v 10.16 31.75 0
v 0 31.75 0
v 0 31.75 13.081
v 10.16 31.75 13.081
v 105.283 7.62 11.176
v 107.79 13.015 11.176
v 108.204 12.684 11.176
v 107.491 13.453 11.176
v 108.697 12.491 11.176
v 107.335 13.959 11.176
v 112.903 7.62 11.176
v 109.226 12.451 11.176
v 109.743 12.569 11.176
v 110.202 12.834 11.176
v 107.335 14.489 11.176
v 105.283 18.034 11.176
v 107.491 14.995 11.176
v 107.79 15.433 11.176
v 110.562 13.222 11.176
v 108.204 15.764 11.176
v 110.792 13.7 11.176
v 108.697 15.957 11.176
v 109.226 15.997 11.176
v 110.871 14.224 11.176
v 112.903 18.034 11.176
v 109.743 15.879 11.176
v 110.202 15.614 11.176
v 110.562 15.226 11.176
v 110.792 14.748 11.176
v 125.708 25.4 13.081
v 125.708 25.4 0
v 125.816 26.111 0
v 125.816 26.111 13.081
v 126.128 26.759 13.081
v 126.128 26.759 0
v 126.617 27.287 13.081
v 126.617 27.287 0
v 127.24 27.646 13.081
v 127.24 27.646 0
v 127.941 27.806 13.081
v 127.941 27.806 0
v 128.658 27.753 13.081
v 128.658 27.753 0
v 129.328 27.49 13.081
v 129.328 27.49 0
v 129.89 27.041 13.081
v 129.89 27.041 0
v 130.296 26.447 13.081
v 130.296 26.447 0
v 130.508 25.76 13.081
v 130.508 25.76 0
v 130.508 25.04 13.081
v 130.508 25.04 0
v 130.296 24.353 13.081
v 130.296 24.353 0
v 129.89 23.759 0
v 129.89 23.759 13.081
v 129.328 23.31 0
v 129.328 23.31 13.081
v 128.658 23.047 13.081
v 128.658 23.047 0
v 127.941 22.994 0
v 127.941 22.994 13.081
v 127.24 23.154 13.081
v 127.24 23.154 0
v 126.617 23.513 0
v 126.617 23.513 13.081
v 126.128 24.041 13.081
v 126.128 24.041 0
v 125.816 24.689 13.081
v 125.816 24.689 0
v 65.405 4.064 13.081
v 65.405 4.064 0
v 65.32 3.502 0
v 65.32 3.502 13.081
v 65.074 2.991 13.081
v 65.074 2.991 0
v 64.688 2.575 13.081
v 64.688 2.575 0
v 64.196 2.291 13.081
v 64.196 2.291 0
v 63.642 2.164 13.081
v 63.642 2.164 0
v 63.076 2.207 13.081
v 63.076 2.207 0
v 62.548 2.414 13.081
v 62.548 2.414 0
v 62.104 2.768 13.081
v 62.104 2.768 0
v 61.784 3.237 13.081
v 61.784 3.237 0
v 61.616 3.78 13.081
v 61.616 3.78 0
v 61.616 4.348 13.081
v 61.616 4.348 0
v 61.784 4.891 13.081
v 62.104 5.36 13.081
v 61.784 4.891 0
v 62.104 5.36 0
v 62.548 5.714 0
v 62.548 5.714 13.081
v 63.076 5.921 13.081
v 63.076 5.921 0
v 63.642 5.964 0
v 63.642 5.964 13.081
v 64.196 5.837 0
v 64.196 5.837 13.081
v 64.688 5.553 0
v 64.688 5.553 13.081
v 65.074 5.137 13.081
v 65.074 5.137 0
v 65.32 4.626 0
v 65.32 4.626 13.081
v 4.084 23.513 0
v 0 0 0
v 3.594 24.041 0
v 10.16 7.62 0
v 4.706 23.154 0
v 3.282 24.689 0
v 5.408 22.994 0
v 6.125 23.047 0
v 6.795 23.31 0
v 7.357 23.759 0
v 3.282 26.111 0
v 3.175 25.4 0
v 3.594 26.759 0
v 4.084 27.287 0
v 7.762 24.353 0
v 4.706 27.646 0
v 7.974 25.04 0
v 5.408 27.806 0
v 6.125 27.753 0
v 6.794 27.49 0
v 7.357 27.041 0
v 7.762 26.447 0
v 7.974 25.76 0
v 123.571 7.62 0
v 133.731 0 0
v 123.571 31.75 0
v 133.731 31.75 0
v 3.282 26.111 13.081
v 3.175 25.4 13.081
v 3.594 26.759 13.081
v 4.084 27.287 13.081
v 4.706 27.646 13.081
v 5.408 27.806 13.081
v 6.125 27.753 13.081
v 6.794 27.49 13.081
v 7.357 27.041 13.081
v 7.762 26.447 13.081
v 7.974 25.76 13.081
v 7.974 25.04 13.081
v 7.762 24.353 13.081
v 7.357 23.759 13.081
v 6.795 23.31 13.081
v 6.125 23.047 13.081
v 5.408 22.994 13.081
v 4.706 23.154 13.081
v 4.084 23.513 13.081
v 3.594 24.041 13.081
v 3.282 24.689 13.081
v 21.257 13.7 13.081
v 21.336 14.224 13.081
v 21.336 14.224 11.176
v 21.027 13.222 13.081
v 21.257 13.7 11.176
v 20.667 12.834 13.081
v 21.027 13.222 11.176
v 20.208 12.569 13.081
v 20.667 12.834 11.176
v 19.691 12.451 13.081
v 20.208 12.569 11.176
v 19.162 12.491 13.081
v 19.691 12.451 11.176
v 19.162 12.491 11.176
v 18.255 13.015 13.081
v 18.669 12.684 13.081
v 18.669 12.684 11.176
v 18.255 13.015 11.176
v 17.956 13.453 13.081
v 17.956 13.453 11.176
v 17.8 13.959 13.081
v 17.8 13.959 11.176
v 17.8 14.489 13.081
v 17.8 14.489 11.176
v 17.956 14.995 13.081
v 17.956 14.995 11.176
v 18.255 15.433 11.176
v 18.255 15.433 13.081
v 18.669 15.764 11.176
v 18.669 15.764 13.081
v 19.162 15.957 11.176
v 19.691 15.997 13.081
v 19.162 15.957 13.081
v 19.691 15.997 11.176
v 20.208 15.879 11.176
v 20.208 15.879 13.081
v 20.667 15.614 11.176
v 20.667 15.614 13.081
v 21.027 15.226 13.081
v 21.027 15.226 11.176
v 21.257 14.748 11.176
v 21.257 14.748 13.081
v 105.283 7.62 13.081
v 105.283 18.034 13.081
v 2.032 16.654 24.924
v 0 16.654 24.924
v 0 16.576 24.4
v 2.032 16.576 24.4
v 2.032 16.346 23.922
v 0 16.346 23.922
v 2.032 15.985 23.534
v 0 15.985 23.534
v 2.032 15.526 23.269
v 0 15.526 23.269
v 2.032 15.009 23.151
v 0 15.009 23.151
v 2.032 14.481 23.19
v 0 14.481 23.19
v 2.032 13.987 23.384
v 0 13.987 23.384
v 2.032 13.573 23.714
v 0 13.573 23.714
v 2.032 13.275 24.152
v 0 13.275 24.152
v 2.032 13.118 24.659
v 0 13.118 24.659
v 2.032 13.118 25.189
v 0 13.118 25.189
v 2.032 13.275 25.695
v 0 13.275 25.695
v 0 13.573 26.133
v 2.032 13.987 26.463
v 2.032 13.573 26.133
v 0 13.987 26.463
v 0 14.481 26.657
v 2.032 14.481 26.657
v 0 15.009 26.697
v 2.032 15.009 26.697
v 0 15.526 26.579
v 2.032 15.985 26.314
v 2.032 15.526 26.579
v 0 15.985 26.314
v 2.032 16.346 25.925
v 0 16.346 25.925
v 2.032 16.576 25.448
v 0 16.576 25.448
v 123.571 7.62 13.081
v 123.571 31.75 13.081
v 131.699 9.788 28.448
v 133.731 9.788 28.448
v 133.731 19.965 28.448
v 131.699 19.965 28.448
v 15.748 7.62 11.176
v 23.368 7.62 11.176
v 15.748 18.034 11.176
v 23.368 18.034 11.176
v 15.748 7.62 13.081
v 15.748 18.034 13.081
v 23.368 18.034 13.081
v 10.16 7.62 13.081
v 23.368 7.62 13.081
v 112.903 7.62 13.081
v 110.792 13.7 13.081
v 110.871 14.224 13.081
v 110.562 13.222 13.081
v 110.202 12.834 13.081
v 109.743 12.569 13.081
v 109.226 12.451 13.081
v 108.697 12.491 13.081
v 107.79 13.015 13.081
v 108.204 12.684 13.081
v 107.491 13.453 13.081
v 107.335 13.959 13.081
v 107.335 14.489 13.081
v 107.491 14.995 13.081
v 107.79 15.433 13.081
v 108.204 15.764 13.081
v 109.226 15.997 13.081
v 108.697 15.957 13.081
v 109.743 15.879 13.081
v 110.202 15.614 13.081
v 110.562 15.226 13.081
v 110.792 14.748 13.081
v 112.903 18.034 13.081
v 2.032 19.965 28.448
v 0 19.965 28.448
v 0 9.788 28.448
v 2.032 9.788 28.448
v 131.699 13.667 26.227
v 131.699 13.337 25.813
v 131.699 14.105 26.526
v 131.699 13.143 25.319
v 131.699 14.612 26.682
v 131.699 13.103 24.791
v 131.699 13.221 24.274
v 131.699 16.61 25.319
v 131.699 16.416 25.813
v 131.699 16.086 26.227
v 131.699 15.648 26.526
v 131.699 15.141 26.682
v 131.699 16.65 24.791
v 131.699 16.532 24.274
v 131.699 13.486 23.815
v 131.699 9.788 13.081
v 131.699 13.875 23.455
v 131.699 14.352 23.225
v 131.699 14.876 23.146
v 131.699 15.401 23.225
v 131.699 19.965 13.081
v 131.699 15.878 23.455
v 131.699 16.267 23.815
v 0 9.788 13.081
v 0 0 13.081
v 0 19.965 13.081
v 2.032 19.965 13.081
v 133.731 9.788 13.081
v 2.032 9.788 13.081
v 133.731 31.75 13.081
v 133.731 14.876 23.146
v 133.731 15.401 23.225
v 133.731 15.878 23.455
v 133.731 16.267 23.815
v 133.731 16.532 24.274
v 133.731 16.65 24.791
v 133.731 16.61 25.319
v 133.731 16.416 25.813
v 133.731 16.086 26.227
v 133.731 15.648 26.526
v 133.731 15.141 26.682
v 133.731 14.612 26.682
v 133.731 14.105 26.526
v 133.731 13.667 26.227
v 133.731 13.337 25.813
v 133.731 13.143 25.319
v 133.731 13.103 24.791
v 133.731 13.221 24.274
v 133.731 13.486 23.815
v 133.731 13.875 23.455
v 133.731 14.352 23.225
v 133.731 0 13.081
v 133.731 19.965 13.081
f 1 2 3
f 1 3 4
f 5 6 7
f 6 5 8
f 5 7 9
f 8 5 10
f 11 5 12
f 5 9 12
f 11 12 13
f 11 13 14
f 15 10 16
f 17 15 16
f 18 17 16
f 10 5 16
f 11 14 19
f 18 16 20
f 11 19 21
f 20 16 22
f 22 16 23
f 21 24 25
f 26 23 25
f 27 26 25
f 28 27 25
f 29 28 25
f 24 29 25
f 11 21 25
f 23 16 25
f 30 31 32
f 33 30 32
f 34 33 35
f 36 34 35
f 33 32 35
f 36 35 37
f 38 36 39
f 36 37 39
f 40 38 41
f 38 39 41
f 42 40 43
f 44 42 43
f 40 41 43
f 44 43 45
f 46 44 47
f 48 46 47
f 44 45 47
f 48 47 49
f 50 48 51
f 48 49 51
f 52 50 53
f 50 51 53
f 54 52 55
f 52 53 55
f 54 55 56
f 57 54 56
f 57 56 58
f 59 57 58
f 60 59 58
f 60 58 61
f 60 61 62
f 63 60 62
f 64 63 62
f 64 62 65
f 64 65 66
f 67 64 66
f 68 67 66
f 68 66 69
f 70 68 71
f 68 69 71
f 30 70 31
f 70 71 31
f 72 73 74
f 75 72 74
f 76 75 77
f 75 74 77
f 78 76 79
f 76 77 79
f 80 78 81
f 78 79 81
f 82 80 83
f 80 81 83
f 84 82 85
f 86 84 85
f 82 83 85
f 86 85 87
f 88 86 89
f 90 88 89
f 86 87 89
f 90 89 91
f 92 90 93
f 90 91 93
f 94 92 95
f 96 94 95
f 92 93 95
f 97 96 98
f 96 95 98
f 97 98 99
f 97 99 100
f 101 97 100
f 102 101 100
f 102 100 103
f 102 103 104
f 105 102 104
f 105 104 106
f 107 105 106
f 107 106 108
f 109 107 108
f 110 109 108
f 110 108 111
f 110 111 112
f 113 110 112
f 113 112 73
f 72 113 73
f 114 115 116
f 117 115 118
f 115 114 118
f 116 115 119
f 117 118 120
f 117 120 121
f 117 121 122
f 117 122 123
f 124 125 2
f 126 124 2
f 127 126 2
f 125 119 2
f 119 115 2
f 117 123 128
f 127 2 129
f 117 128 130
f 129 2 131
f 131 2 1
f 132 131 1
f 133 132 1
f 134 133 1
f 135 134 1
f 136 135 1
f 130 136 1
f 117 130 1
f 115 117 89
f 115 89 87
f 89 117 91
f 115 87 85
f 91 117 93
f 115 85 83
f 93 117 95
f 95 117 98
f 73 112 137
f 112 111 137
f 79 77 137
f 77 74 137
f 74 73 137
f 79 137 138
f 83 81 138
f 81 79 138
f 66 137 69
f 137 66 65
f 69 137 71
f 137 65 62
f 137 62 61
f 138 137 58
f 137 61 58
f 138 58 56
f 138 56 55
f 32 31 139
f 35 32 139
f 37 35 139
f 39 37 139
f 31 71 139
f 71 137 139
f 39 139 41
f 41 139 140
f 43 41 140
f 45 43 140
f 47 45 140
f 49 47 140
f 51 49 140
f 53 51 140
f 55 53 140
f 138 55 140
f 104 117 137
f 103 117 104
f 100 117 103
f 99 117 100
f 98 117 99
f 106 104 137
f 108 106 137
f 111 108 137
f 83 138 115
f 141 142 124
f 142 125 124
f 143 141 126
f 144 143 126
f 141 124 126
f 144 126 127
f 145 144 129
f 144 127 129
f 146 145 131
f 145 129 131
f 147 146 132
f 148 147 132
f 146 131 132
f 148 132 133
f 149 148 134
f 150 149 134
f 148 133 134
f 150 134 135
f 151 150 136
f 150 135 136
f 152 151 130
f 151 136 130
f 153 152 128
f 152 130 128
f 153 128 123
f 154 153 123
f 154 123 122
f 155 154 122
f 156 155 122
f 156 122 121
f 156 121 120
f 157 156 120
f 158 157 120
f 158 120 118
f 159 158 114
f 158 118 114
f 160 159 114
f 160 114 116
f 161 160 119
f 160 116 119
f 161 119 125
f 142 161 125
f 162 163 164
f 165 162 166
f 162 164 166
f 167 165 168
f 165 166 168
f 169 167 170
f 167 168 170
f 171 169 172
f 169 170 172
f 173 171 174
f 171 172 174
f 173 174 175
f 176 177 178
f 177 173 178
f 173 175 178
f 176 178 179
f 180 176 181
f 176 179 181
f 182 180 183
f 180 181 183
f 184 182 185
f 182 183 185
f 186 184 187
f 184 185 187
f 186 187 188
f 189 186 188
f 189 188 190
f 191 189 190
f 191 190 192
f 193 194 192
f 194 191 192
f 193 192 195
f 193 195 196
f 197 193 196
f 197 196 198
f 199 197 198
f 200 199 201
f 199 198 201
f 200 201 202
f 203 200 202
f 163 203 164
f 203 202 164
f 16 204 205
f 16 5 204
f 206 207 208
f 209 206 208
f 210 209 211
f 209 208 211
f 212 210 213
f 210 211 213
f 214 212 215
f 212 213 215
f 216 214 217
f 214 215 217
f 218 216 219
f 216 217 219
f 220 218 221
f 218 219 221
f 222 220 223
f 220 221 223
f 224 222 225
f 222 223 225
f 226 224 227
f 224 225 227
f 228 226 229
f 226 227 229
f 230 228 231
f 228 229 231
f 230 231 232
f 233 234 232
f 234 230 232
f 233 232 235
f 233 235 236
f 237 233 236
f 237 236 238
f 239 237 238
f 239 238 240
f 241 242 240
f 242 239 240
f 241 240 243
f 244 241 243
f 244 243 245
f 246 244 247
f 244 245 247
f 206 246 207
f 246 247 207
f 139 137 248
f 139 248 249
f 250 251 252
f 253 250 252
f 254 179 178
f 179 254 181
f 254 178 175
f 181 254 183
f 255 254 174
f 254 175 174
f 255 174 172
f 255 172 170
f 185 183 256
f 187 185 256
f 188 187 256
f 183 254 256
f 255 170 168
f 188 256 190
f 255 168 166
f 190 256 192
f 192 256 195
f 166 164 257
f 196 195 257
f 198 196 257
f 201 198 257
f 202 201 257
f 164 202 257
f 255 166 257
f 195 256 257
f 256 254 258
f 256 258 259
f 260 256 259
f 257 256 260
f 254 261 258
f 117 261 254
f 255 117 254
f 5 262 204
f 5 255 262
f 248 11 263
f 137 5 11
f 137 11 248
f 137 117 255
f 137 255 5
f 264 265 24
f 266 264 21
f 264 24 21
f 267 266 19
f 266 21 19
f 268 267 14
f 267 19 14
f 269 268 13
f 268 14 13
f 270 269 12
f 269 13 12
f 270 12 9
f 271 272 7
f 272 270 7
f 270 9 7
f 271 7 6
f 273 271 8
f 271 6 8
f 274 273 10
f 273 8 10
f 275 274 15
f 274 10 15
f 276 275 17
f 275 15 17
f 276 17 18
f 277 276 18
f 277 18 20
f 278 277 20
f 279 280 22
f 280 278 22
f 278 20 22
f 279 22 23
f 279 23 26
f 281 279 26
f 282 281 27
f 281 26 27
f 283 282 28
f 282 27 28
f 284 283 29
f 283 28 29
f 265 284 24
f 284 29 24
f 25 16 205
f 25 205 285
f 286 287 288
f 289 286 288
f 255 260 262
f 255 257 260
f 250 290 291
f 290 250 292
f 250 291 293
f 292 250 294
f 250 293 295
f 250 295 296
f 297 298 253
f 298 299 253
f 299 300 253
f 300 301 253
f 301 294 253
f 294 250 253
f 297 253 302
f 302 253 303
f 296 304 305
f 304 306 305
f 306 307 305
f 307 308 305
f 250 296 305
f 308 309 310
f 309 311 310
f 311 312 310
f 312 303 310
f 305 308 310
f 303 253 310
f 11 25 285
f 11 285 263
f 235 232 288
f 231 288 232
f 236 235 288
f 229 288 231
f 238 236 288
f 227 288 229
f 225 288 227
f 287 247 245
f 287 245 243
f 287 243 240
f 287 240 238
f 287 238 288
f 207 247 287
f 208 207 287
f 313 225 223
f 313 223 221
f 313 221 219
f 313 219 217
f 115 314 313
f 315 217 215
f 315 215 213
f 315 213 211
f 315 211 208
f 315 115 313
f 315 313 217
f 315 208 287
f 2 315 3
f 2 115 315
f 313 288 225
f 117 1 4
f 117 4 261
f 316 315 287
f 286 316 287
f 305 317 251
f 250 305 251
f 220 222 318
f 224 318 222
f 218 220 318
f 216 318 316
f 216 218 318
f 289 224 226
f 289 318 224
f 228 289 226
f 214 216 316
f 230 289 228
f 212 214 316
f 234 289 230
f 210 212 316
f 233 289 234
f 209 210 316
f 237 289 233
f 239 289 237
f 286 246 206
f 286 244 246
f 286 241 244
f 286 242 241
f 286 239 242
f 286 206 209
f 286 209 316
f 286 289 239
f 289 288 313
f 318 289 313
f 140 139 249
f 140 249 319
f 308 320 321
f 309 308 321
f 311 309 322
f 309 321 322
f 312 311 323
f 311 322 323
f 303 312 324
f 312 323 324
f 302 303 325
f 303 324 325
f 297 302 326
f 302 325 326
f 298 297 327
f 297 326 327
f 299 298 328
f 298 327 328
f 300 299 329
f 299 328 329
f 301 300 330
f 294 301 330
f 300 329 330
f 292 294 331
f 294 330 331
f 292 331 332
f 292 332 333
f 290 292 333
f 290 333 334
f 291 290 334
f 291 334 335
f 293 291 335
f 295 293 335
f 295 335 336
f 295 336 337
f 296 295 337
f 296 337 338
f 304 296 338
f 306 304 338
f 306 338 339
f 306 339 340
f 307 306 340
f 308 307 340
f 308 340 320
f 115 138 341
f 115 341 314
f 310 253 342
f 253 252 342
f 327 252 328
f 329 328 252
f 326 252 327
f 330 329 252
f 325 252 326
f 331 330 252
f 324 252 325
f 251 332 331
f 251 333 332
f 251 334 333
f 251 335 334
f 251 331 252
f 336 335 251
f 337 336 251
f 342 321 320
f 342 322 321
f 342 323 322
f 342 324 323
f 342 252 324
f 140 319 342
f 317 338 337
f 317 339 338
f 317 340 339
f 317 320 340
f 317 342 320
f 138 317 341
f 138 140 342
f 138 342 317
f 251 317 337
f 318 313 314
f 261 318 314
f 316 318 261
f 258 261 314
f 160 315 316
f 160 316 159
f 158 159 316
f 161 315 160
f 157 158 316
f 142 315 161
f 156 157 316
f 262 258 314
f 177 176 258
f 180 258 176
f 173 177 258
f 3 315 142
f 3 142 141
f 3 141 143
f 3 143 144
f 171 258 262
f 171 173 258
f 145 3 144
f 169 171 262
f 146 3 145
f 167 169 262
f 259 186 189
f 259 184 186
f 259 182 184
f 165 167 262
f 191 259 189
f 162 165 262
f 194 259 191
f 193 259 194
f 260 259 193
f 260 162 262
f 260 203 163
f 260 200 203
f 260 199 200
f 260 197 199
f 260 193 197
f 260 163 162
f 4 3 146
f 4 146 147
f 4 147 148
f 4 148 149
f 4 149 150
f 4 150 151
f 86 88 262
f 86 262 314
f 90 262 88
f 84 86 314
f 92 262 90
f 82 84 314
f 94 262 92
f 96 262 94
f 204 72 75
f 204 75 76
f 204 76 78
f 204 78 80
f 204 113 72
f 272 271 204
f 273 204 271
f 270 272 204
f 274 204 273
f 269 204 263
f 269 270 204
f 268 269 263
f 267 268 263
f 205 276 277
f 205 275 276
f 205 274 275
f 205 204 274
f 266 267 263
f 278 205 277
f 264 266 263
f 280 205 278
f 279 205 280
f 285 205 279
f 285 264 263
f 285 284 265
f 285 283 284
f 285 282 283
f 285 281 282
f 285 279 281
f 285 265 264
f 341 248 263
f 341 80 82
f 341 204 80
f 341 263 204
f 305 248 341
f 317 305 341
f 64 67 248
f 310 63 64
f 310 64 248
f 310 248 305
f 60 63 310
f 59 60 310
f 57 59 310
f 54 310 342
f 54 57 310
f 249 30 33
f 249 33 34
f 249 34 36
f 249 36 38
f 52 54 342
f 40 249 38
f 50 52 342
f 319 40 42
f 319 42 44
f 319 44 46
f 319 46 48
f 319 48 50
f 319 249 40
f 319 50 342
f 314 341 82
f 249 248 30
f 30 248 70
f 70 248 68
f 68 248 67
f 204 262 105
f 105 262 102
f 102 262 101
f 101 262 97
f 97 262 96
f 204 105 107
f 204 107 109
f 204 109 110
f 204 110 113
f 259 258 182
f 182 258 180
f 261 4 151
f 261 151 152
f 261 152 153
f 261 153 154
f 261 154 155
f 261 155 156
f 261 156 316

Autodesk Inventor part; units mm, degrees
ref_plane "YZ Plane" through (0, 0, 0) normal (1, 0, 0) x (0, 1, 0)
ref_plane "XZ Plane" through (0, 0, 0) normal (0, 1, 0) x (-1, 0, 0)
ref_plane "XY Plane" through (0, 0, 0) normal (0, 0, 1) x (1, 0, 0)
sketch "Sketch1" plane through (0, 0, 0) normal (0, 0, 1) x (1, 0, 0)
  line L0 (0, 0) -> (0, 31.75)
  line L1 (0, 31.75) -> (10.16, 31.75)
  line L2 (10.16, 31.75) -> (10.16, 7.62)
  line L3 (10.16, 7.62) -> (15.748, 7.62)
  line L4 (15.748, 7.62) -> (15.748, 18.034)
  line L5 (15.748, 18.034) -> (23.368, 18.034)
  line L6 (23.368, 18.034) -> (23.368, 7.62)
  line L7 (23.368, 7.62) -> (105.283, 7.62)
  line L8 (105.283, 7.62) -> (105.283, 18.034)
  line L9 (105.283, 18.034) -> (112.903, 18.034)
  line L10 (112.903, 18.034) -> (112.903, 7.62)
  line L11 (112.903, 7.62) -> (123.571, 7.62)
  line L12 (123.571, 7.62) -> (123.571, 31.75)
  line L13 (123.571, 31.75) -> (133.731, 31.75)
  circle A0 centre (109.093, 14.224) radius 1.778
  circle A1 centre (5.588, 25.4) radius 1.905
  line L14 (133.731, 31.75) -> (133.731, 0)
  line L15 (133.731, 0) -> (0, 0)
  circle A2 centre (128.143, 25.4) radius 1.905
  circle A3 centre (19.558, 14.224) radius 1.778
  circle A4 centre (63.5, 4.064) radius 1.905
  dimension "d0" = 31.75
  dimension "d1" = 10.16
  dimension "d2" = 24.13
  dimension "d3" = 5.588
  dimension "d19" = 10.414
  dimension "d20" = 7.62
  dimension "d21" = 10.414
  dimension "d23" = 81.915
  dimension "d24" = 10.414
  dimension "d25" = 7.62
  dimension "d26" = 10.414
  dimension "d27" = 10.668
  dimension "d28" = 24.13
  dimension "d29" = 10.16
  dimension "d30" = 3.556
  dimension "d31" = 3.81
  dimension "d33" = 133.731
  dimension "d34" = 3.81
  dimension "d37" = 3.556
  dimension "d42" = 3.81
  dimension "d57" = 63.5
  dimension "d58" = 25.4
sketch "Sketch2" plane through (0, 0, 0) normal (0, 0, 1) x (1, 0, 0)
  line L0 (15.748, 7.62) -> (10.16, 7.62) projected
  line L1 (12.954, 7.62) -> (117.9845, 7.62)
  line L2 (117.9845, 7.62) -> (117.9845, 21.0811)
  line L3 (117.9845, 21.0811) -> (12.954, 21.0811)
  line L4 (12.954, 21.0811) -> (12.954, 7.62)
  point P0 (0, 0)
extrude "Extrusion4" add sketch "Sketch1" along normal blind 13.081
extrude "Extrusion5" cut sketch "Sketch2" along normal blind 11.176
sketch "Sketch3" plane through (0, 0, 0) normal (1, 0, 0) x (0, 1, 0)
  line L0 (31.75, 13.081) -> (0, 13.081) projected
  line L1 (19.9646, 13.081) -> (19.9646, 28.448)
  line L2 (19.9646, 28.448) -> (9.7883, 28.448)
  line L3 (9.7883, 28.448) -> (9.7883, 13.081)
  circle A0 centre (14.8765, 24.9237) radius 1.778
  point P0 (0, 0)
  dimension "d47" = 15.367
  dimension "d48" = 3.556
extrude "Extrusion6" add sketch "Sketch3" along normal blind 2.032
ref_plane "Work Plane2" through (133.731, 0, 0) normal (1, 0, 0) x (0, 0, -1)
sketch "Sketch4" plane through (133.731, 0, 0) normal (1, 0, 0) x (0, 0, -1)
  line L0 (-13.081, 9.7883) -> (-28.448, 9.7883) projected
  line L1 (-28.448, 9.7883) -> (-28.448, 19.9646) projected
  line L2 (-13.081, 9.7883) -> (-28.448, 9.7883)
  line L3 (-28.448, 9.7883) -> (-28.448, 19.9646)
  line L4 (-28.448, 19.9646) -> (-13.081, 19.9646) projected
  line L5 (-28.448, 19.9646) -> (-13.081, 19.9646)
  line L6 (-13.081, 19.9646) -> (-13.081, 9.7883)
  line L7 (-13.081, 7.62) -> (-13.081, 18.034) projected
  circle A0 centre (-24.9237, 14.8765) radius 1.778 projected
  circle A1 centre (-24.9237, 14.8765) radius 1.778
  point P0 (0, 0)
extrude "Extrusion8" add sketch "Sketch4" against normal blind 2.032
ref_plane "Work Plane3" through (0, 0, 0) normal (0, 0, -1) x (-1, 0, 0)
sketch "Sketch5" plane through (0, 0, 0) normal (0, 0, -1) x (-1, 0, 0)
  circle A0 centre (-5.588, 25.4) radius 2.413
  circle A1 centre (-63.5, 4.064) radius 1.905 projected
  circle A2 centre (-63.5, 4.064) radius 2.286
  circle A3 centre (-128.1215, 25.4) radius 2.413
  point P0 (0, 0)
  dimension "d60" = 4.826
  dimension "d61" = 4.572
  dimension "d62" = 4.826
extrude "Extrusion9" cut sketch "Sketch5" against normal blind 15.24 contours A0 | A1 | A3
properties part number "PC_bottom_piece"
